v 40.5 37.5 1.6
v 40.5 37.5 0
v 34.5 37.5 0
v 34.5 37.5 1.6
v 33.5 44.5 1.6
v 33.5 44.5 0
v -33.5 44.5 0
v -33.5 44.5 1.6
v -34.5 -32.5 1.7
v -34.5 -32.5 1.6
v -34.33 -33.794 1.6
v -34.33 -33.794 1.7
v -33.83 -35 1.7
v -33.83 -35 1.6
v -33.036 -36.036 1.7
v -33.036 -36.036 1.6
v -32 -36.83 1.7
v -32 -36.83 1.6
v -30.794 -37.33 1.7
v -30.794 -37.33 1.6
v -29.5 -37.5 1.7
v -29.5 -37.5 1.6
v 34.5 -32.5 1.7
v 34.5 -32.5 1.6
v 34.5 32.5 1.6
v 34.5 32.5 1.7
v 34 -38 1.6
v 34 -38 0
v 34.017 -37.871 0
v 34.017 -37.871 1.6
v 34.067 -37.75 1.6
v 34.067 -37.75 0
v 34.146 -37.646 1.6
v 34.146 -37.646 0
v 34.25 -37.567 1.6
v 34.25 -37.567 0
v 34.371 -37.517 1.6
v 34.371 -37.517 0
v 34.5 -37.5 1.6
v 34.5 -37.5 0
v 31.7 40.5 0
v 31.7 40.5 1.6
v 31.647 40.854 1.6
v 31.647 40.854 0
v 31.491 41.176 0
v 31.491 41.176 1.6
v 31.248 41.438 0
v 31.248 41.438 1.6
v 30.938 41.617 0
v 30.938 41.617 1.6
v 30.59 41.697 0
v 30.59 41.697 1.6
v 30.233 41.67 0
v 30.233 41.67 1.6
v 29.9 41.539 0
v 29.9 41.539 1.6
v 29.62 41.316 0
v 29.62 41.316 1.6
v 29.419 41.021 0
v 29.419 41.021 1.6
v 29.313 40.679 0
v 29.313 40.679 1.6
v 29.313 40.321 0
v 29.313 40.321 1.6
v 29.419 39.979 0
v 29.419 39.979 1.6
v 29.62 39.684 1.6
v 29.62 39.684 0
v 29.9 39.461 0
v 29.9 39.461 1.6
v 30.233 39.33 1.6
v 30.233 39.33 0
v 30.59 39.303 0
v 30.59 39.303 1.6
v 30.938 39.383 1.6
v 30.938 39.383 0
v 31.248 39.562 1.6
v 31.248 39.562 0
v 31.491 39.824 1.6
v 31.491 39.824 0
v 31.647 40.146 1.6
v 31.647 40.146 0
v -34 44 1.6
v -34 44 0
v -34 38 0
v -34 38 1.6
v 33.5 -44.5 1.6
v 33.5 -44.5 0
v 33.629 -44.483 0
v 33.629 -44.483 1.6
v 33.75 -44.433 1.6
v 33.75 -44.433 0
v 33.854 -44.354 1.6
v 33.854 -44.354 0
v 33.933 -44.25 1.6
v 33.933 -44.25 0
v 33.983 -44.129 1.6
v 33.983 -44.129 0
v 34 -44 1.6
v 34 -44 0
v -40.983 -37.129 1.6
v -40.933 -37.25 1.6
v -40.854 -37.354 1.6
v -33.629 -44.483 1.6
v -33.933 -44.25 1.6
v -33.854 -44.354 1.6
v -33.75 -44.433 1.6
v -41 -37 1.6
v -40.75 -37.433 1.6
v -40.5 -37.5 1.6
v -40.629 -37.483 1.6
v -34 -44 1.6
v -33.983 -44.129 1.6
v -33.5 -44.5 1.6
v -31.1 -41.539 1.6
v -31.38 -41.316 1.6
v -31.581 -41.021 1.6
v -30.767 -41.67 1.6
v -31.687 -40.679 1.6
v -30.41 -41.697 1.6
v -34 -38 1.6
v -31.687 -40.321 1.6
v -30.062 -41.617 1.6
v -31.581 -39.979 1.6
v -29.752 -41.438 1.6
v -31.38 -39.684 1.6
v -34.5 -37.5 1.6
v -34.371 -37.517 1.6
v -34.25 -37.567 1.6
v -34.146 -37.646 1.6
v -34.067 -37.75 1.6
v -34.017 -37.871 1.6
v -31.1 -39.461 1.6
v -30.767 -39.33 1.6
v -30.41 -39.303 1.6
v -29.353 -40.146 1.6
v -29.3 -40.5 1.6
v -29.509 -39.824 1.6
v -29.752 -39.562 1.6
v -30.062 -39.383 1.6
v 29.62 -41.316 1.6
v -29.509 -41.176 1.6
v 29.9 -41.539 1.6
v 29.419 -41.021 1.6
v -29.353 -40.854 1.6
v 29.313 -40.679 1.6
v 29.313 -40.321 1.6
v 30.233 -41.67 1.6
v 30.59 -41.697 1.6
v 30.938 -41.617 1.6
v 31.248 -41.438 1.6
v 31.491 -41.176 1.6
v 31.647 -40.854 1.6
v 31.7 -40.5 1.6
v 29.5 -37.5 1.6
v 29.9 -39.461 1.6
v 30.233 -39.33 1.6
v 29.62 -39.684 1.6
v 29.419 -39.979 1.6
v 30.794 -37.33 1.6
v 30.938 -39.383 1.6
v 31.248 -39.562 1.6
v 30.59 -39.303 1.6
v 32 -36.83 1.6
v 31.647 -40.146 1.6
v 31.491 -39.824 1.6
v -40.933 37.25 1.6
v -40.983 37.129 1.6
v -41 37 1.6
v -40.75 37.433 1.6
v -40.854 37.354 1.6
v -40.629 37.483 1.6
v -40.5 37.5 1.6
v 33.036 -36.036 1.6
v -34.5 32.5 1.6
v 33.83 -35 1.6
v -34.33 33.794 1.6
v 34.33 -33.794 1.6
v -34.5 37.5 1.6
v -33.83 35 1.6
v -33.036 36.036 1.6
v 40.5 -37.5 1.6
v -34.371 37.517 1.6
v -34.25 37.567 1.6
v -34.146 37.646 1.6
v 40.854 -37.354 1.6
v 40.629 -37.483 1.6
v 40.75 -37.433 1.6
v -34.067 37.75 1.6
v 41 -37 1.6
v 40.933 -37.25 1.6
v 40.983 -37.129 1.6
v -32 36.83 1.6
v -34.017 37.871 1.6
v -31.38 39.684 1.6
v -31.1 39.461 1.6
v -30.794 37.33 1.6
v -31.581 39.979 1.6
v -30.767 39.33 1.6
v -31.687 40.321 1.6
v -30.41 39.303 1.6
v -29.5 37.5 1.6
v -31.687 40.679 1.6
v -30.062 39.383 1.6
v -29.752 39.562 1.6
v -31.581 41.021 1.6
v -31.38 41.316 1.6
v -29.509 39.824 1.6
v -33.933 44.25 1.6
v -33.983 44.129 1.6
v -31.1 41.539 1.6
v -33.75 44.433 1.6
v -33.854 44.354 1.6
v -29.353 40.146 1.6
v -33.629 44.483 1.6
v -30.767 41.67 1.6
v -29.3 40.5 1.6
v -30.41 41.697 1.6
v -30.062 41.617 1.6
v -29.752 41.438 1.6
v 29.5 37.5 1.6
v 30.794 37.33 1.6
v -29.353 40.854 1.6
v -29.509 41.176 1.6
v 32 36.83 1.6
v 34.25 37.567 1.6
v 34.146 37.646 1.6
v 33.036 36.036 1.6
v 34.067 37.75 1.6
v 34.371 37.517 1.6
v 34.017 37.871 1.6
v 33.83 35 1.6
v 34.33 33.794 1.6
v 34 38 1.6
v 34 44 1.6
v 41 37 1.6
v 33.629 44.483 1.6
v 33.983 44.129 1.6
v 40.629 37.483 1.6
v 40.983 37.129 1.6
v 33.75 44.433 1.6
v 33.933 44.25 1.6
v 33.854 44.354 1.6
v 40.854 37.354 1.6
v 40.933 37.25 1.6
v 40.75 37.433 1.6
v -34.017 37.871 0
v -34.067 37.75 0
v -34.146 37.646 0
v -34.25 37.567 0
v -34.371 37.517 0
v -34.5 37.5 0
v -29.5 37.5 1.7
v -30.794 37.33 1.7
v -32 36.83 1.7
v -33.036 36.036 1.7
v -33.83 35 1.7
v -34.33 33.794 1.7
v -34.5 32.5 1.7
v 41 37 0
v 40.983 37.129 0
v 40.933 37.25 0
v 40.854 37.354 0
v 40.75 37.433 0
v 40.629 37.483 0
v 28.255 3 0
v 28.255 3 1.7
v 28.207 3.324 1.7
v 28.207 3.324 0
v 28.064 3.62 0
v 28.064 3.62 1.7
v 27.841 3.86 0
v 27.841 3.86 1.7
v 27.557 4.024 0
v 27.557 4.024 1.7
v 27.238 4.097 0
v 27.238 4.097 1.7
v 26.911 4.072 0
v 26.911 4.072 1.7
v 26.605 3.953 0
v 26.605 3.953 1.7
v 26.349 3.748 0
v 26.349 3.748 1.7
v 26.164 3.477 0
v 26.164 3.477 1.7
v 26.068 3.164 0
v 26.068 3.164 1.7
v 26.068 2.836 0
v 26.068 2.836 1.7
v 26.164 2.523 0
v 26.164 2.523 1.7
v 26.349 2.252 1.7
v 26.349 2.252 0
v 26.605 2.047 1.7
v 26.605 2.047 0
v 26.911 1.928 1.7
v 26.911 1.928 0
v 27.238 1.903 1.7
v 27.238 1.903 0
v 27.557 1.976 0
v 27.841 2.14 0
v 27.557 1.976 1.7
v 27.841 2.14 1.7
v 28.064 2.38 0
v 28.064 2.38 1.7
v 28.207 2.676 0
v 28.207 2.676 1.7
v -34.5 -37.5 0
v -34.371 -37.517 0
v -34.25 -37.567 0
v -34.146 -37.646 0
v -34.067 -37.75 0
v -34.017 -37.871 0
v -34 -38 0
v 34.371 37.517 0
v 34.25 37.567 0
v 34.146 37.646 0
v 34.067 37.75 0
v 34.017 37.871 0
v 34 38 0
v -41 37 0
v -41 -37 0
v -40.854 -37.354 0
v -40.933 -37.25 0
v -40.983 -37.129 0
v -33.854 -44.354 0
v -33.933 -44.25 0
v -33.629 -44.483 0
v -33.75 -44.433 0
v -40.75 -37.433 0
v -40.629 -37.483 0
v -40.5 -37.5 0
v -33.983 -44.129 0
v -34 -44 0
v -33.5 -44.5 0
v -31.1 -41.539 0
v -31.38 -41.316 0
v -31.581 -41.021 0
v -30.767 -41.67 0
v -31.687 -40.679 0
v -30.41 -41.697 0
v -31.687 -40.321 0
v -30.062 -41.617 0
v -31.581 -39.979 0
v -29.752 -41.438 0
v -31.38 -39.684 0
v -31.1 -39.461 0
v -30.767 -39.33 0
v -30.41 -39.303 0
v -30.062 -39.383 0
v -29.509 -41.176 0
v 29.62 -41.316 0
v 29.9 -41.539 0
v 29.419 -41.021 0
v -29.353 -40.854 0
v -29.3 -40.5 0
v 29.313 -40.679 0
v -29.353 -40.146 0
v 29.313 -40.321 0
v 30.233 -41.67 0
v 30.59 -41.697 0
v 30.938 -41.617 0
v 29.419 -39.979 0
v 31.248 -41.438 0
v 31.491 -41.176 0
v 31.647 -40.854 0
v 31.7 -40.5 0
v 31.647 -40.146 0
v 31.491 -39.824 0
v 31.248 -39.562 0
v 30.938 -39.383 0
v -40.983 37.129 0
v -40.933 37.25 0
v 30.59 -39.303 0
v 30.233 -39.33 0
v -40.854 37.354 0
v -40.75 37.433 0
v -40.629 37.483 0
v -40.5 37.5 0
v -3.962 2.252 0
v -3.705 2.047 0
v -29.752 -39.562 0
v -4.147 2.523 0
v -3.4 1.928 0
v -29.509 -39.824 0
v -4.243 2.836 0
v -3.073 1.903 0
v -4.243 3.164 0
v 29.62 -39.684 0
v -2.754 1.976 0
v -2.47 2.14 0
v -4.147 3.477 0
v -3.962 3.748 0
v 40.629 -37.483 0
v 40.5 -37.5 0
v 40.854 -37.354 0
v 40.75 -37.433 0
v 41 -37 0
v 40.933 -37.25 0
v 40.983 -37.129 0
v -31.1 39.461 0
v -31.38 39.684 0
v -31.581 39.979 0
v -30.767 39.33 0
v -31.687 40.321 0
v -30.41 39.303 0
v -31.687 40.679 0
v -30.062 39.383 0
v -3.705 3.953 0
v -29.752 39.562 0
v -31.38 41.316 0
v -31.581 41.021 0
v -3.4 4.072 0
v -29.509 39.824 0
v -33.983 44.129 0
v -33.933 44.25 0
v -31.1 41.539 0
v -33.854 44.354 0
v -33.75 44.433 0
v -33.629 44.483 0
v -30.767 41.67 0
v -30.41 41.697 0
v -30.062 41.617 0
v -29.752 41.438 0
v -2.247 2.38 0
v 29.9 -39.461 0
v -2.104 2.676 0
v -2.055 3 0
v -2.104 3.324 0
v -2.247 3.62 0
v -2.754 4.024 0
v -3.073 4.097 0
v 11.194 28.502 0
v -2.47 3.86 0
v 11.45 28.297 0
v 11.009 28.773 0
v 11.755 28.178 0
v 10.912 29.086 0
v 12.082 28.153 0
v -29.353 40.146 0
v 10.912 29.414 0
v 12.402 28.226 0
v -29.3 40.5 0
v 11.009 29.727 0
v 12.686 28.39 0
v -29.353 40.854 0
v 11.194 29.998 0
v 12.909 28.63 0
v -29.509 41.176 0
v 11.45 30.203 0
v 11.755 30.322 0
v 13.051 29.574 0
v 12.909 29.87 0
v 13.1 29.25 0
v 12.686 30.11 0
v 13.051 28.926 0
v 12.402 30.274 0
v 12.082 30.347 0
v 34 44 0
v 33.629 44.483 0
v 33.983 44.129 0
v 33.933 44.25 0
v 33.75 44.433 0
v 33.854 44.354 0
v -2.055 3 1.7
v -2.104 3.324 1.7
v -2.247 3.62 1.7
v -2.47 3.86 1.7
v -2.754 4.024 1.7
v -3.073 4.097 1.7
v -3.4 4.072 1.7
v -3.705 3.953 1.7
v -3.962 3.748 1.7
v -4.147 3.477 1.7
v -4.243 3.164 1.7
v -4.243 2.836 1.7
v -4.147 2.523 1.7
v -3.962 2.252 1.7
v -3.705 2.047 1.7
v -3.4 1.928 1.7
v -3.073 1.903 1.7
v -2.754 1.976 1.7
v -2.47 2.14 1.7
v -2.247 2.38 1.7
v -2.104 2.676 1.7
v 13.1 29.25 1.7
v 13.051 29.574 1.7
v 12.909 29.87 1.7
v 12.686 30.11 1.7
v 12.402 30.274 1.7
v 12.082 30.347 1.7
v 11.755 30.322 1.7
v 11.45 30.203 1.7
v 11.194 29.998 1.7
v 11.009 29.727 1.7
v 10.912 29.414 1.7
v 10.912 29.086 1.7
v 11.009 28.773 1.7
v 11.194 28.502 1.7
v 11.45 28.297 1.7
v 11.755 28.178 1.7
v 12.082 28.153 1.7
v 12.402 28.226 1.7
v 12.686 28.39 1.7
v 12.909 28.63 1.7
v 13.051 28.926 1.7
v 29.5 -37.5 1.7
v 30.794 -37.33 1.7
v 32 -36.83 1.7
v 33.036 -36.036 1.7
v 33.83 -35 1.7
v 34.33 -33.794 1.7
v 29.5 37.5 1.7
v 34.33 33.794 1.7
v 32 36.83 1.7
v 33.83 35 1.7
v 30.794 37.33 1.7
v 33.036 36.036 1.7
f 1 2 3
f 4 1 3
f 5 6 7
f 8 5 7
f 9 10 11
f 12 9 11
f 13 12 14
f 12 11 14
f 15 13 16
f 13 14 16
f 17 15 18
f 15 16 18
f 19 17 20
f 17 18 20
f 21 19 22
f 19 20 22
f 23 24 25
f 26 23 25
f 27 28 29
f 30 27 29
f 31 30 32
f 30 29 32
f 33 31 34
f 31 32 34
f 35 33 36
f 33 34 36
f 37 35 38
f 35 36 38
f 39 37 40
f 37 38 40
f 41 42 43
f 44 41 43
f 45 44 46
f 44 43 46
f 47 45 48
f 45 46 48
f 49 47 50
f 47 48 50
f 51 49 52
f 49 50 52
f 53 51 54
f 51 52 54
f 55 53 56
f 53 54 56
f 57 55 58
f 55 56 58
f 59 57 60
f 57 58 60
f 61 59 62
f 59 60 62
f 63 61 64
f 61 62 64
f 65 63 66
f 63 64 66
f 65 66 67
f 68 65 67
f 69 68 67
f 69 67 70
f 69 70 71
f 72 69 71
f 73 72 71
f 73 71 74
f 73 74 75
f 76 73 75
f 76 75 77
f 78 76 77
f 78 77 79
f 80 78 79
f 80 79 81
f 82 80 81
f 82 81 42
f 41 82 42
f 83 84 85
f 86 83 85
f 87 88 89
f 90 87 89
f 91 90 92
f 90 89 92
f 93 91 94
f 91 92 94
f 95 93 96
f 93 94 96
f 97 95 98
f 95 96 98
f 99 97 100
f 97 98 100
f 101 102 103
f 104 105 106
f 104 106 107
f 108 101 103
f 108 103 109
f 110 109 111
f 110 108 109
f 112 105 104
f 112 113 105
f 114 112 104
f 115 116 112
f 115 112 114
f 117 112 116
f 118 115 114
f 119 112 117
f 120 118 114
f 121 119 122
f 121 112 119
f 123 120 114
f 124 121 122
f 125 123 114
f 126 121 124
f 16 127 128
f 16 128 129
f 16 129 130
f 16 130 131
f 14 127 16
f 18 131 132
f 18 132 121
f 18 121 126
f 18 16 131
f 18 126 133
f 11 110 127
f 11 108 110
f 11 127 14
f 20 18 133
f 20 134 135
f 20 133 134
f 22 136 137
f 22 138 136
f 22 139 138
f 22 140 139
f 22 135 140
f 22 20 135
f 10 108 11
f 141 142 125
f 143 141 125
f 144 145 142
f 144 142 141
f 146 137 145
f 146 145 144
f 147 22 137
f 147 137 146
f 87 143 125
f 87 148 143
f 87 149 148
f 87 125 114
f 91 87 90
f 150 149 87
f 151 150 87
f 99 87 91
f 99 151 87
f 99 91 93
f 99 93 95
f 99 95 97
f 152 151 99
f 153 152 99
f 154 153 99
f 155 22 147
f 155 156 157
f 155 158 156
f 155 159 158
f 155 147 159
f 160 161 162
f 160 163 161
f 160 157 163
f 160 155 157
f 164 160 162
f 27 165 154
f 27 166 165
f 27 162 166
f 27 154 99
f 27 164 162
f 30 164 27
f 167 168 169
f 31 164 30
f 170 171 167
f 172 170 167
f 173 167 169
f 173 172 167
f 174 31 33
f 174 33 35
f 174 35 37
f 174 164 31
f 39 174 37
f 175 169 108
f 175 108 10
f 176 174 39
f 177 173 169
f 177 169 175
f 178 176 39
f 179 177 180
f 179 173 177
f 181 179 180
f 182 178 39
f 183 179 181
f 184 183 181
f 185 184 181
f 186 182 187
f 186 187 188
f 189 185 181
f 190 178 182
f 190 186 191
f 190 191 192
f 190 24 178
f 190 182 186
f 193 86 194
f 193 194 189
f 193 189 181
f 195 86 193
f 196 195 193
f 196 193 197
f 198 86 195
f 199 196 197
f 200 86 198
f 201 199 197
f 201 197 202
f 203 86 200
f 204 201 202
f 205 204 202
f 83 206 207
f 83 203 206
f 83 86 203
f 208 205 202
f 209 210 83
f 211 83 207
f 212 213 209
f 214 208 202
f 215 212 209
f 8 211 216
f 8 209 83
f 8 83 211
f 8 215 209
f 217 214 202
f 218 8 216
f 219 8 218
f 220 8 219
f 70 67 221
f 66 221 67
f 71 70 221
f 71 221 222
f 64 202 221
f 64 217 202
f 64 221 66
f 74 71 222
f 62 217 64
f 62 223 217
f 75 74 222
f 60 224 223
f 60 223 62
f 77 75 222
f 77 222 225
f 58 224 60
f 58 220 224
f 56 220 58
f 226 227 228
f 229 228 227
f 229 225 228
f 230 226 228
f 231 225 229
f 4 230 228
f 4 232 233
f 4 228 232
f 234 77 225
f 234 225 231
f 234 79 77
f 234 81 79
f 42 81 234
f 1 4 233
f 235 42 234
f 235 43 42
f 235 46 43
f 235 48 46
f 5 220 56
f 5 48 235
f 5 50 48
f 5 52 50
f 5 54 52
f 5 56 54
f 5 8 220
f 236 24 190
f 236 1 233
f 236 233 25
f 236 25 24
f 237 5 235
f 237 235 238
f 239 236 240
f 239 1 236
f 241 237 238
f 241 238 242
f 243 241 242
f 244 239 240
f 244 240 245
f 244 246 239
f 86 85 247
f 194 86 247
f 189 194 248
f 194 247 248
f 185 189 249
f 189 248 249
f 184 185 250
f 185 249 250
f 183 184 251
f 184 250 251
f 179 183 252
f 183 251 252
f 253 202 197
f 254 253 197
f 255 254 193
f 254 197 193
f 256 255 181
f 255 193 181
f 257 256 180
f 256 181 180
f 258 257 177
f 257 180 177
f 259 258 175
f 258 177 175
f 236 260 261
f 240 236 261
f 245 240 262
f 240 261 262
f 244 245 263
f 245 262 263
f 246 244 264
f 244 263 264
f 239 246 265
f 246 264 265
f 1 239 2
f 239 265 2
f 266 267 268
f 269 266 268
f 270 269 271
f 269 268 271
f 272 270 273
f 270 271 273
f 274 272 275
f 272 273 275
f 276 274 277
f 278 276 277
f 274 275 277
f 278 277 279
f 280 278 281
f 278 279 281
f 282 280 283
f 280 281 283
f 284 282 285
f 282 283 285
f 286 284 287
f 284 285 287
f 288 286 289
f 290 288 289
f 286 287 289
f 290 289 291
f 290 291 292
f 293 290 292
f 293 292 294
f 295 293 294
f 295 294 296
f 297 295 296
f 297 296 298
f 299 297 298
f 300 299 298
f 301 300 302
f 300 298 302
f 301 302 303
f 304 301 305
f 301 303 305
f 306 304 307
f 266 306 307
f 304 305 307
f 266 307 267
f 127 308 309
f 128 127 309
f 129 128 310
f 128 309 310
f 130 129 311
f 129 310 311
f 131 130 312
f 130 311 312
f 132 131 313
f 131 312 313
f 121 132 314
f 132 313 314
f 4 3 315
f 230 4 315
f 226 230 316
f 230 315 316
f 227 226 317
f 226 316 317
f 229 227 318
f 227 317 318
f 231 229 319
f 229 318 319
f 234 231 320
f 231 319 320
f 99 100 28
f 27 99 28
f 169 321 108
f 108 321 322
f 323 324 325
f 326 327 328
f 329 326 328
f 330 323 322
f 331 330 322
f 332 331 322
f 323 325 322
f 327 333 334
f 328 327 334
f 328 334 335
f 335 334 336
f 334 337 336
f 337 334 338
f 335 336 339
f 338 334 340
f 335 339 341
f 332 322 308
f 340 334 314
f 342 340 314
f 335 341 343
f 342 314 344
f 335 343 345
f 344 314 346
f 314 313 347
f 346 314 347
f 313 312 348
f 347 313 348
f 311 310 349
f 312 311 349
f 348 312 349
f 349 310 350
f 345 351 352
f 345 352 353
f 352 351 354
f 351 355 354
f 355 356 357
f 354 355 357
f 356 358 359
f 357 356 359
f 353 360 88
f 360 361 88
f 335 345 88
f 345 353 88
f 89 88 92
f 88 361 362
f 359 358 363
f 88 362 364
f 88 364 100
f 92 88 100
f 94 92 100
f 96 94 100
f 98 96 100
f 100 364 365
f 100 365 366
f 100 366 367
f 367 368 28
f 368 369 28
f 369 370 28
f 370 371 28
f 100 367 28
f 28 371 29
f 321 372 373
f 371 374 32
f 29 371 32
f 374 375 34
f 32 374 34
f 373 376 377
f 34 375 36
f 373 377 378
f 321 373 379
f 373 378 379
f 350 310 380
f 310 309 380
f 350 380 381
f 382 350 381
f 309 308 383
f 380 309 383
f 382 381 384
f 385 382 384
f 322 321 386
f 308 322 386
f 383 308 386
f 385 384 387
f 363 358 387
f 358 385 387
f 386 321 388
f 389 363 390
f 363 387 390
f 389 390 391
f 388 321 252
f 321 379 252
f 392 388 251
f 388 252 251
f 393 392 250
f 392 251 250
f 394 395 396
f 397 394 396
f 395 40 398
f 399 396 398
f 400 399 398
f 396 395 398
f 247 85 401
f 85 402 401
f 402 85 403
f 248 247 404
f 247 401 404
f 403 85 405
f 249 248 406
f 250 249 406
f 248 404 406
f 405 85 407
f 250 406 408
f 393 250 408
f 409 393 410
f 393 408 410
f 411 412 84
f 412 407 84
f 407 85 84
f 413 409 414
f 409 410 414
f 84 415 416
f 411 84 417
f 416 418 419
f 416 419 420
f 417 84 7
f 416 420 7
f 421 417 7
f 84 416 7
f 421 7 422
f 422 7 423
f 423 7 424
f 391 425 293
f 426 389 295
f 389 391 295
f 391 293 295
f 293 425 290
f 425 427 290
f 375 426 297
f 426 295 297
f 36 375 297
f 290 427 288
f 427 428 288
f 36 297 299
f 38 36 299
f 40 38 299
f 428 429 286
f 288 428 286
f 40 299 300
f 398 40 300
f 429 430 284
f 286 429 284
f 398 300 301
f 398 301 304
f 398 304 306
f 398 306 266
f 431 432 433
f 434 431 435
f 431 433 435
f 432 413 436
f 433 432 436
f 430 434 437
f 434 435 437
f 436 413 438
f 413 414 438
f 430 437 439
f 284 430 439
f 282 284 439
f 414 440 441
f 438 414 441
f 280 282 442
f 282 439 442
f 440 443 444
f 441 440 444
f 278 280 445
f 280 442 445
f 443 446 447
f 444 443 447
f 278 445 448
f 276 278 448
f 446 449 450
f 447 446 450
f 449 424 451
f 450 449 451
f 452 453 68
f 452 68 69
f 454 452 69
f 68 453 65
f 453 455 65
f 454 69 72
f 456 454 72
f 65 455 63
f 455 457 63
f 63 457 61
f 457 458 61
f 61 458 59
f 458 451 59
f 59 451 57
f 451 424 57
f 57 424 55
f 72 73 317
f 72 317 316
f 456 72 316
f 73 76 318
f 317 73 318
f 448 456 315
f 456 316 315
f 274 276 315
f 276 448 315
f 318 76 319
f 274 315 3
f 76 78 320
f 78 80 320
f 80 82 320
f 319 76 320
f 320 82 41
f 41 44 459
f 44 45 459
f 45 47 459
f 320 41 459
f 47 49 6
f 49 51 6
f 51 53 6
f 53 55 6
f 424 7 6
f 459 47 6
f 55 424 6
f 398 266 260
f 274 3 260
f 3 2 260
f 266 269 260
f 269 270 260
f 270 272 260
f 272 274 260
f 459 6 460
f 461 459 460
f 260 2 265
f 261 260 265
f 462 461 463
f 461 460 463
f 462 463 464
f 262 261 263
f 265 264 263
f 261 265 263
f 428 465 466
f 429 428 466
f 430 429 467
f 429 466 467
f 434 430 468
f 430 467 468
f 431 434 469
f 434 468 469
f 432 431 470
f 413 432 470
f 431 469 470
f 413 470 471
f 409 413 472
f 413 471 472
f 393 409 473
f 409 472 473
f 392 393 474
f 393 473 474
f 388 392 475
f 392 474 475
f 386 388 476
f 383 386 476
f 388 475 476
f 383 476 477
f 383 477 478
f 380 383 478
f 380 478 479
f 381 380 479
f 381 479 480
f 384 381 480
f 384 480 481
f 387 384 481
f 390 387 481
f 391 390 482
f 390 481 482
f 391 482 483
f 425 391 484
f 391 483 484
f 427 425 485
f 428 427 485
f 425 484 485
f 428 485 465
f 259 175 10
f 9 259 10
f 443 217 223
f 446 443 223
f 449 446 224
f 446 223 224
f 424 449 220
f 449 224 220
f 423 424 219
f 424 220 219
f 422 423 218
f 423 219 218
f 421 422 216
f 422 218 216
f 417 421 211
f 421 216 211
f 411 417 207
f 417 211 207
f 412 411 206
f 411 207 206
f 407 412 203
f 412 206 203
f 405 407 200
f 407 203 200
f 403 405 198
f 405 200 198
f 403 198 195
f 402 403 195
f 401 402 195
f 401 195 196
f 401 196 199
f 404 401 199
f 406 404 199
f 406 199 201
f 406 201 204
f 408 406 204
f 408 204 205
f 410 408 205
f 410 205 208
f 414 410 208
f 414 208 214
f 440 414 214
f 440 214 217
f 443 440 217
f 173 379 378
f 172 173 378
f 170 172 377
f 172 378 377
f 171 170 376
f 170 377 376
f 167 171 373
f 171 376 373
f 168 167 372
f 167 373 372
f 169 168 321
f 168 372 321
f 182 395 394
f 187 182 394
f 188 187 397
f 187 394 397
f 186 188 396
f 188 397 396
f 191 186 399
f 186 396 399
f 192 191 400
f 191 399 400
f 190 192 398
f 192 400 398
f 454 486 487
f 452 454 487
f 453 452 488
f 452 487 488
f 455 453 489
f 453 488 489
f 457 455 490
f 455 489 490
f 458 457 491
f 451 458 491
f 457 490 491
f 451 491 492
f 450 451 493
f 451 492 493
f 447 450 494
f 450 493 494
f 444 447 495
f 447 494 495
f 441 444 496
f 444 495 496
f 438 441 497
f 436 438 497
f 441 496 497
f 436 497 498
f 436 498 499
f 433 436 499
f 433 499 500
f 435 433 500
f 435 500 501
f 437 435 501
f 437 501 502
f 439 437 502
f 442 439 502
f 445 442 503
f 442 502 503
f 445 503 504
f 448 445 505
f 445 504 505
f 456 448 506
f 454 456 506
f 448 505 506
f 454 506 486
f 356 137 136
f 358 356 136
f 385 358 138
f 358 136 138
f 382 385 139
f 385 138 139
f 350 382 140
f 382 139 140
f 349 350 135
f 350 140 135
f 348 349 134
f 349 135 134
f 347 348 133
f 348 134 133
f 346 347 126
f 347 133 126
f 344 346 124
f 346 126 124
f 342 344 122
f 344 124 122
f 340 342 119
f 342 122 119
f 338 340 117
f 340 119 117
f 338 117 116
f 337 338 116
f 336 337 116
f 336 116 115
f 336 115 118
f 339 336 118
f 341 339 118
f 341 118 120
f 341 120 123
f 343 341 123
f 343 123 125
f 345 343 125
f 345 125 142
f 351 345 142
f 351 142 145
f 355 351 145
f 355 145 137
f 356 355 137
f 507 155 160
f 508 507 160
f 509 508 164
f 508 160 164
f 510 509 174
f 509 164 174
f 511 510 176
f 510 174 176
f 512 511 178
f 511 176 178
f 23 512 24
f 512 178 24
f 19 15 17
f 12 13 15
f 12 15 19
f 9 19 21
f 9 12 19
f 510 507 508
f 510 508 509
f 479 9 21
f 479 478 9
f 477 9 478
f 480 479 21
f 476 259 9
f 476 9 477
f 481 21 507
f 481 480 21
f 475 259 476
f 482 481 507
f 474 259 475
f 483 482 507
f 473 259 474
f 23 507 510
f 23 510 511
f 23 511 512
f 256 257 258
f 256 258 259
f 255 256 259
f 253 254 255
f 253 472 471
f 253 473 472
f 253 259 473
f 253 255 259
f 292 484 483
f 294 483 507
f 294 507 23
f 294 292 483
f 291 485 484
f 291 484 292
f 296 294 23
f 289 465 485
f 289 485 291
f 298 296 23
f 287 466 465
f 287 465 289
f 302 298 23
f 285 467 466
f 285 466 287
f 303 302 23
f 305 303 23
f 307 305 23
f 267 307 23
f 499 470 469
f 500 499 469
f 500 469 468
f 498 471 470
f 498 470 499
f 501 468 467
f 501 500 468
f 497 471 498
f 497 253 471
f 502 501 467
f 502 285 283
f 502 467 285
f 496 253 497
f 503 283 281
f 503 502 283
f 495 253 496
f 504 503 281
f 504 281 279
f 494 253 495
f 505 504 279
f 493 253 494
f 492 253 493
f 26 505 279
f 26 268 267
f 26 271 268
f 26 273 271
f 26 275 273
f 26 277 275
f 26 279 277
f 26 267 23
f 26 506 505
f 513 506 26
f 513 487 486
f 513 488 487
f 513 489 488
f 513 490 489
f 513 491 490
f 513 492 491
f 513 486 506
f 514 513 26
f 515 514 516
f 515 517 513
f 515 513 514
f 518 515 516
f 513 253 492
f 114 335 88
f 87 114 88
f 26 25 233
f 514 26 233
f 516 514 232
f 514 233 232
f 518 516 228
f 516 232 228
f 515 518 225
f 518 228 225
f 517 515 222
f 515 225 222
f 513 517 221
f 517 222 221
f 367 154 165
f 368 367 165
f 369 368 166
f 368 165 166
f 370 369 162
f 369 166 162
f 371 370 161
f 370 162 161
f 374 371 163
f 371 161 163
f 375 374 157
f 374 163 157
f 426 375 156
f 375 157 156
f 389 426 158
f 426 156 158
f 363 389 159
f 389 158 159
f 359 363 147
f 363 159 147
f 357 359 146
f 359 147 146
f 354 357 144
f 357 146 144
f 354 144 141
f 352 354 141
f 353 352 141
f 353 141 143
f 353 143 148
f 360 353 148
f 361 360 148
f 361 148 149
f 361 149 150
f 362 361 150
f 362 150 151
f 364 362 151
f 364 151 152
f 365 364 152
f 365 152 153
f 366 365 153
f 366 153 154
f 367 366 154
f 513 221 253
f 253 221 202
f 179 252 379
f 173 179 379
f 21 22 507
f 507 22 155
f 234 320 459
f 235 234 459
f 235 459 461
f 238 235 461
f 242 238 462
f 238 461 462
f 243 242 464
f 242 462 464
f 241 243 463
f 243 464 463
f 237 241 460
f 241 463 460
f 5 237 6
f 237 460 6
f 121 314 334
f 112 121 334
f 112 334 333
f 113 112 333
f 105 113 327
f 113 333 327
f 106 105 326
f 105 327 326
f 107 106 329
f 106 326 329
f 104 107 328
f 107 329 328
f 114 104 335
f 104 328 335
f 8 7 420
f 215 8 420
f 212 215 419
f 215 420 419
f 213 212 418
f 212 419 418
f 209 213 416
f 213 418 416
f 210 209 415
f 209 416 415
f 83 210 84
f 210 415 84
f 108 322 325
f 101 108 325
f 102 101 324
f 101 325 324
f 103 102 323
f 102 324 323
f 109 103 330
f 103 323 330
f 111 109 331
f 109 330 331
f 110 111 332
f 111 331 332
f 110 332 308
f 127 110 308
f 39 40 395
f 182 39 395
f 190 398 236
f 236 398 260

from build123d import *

# Parameters (mm, degrees)
BOSS_EXTRUDE1_DEPTH            = 1.6
BOSS_EXTRUDE2_DEPTH            = 0.1
M2_HOLE1_FIXINGSTRUCTURE_D     = 2.4
M2_HOLE1_FIXINGSTRUCTURE_DEPTH = 200
M2_HOLE1_FIXINGSTRUCTURE_TIP   = 0.721032743
SKETCH5_R                      = 1.1
CUT_EXTRUDE1_DEPTH             = 1.7


with BuildPart() as part:
    # Sketch1 → Boss-Extrude1 (new body)
    with BuildSketch(Plane.XY):
        with BuildLine():
            Line((-34, 44), (-34, 38))
            ThreePointArc((-34, 38), (-34.146446609, 37.646446609), (-34.5, 37.5))
            Line((-34.5, 37.5), (-40.5, 37.5))
            ThreePointArc((-40.5, 37.5), (-40.853553391, 37.353553391), (-41, 37))
            Line((-41, 37), (-41, -37))
            ThreePointArc((-41, -37), (-40.853553391, -37.353553391), (-40.5, -37.5))
            Line((-40.5, -37.5), (-34.5, -37.5))
            ThreePointArc((-34.5, -37.5), (-34.146446609, -37.646446609), (-34, -38))
            Line((-34, -38), (-34, -44))
            ThreePointArc((-34, -44), (-33.853553391, -44.353553391), (-33.5, -44.5))
            Line((-33.5, -44.5), (33.5, -44.5))
            ThreePointArc((33.5, -44.5), (33.853553391, -44.353553391), (34, -44))
            Line((34, -44), (34, -38))
            ThreePointArc((34, -38), (34.146446609, -37.646446609), (34.5, -37.5))
            Line((34.5, -37.5), (40.5, -37.5))
            ThreePointArc((40.5, -37.5), (40.853553391, -37.353553391), (41, -37))
            Line((41, -37), (41, 37))
            ThreePointArc((41, 37), (40.853553391, 37.353553391), (40.5, 37.5))
            Line((40.5, 37.5), (34.5, 37.5))
            ThreePointArc((34.5, 37.5), (34.146446609, 37.646446609), (34, 38))
            Line((34, 38), (34, 44))
            ThreePointArc((34, 44), (33.853553391, 44.353553391), (33.5, 44.5))
            Line((33.5, 44.5), (-33.5, 44.5))
            ThreePointArc((-33.5, 44.5), (-33.853553391, 44.353553391), (-34, 44))
        make_face()
    extrude(amount=BOSS_EXTRUDE1_DEPTH)

    # Esboço1 → Boss-Extrude2 (add)
    with BuildSketch(Plane.XY.offset(1.6)):
        with BuildLine():
            Line((-29.5, -37.5), (29.5, -37.5))
            ThreePointArc((29.5, -37.5), (33.035533906, -36.035533906), (34.5, -32.5))
            Line((34.5, -32.5), (34.5, 32.5))
            ThreePointArc((34.5, 32.5), (33.035533906, 36.035533906), (29.5, 37.5))
            Line((29.5, 37.5), (-29.5, 37.5))
            ThreePointArc((-29.5, 37.5), (-33.035533906, 36.035533906), (-34.5, 32.5))
            Line((-34.5, 32.5), (-34.5, -32.5))
            ThreePointArc((-34.5, -32.5), (-33.035533906, -36.035533906), (-29.5, -37.5))
        make_face()
    extrude(amount=BOSS_EXTRUDE2_DEPTH)

    # M2 Hole1-FixingStructure
    with Locations(Plane(origin=(0, 0, 0), x_dir=(-1, 0, 0), z_dir=(0, 0, -1))):
        with Locations((-30.5, 40.5), (30.5, 40.5), (-30.5, -40.5), (30.5, -40.5)):
            Hole(M2_HOLE1_FIXINGSTRUCTURE_D / 2, depth=M2_HOLE1_FIXINGSTRUCTURE_DEPTH)
            with Locations((0, 0, -(M2_HOLE1_FIXINGSTRUCTURE_DEPTH + M2_HOLE1_FIXINGSTRUCTURE_TIP / 2))):  # 118° drill point
                Cone(0, M2_HOLE1_FIXINGSTRUCTURE_D / 2, M2_HOLE1_FIXINGSTRUCTURE_TIP, mode=Mode.SUBTRACT)

    # Sketch5 → Cut-Extrude1 (cut)
    with BuildSketch(Plane.XY.offset(1.7)):
        with Locations((27.155444566, 3)):
            Circle(SKETCH5_R)
        with Locations((12, 29.25)):
            Circle(SKETCH5_R)
        with Locations((-3.155444566, 3)):
            Circle(SKETCH5_R)
    extrude(amount=-CUT_EXTRUDE1_DEPTH, mode=Mode.SUBTRACT)


solid = part.part
